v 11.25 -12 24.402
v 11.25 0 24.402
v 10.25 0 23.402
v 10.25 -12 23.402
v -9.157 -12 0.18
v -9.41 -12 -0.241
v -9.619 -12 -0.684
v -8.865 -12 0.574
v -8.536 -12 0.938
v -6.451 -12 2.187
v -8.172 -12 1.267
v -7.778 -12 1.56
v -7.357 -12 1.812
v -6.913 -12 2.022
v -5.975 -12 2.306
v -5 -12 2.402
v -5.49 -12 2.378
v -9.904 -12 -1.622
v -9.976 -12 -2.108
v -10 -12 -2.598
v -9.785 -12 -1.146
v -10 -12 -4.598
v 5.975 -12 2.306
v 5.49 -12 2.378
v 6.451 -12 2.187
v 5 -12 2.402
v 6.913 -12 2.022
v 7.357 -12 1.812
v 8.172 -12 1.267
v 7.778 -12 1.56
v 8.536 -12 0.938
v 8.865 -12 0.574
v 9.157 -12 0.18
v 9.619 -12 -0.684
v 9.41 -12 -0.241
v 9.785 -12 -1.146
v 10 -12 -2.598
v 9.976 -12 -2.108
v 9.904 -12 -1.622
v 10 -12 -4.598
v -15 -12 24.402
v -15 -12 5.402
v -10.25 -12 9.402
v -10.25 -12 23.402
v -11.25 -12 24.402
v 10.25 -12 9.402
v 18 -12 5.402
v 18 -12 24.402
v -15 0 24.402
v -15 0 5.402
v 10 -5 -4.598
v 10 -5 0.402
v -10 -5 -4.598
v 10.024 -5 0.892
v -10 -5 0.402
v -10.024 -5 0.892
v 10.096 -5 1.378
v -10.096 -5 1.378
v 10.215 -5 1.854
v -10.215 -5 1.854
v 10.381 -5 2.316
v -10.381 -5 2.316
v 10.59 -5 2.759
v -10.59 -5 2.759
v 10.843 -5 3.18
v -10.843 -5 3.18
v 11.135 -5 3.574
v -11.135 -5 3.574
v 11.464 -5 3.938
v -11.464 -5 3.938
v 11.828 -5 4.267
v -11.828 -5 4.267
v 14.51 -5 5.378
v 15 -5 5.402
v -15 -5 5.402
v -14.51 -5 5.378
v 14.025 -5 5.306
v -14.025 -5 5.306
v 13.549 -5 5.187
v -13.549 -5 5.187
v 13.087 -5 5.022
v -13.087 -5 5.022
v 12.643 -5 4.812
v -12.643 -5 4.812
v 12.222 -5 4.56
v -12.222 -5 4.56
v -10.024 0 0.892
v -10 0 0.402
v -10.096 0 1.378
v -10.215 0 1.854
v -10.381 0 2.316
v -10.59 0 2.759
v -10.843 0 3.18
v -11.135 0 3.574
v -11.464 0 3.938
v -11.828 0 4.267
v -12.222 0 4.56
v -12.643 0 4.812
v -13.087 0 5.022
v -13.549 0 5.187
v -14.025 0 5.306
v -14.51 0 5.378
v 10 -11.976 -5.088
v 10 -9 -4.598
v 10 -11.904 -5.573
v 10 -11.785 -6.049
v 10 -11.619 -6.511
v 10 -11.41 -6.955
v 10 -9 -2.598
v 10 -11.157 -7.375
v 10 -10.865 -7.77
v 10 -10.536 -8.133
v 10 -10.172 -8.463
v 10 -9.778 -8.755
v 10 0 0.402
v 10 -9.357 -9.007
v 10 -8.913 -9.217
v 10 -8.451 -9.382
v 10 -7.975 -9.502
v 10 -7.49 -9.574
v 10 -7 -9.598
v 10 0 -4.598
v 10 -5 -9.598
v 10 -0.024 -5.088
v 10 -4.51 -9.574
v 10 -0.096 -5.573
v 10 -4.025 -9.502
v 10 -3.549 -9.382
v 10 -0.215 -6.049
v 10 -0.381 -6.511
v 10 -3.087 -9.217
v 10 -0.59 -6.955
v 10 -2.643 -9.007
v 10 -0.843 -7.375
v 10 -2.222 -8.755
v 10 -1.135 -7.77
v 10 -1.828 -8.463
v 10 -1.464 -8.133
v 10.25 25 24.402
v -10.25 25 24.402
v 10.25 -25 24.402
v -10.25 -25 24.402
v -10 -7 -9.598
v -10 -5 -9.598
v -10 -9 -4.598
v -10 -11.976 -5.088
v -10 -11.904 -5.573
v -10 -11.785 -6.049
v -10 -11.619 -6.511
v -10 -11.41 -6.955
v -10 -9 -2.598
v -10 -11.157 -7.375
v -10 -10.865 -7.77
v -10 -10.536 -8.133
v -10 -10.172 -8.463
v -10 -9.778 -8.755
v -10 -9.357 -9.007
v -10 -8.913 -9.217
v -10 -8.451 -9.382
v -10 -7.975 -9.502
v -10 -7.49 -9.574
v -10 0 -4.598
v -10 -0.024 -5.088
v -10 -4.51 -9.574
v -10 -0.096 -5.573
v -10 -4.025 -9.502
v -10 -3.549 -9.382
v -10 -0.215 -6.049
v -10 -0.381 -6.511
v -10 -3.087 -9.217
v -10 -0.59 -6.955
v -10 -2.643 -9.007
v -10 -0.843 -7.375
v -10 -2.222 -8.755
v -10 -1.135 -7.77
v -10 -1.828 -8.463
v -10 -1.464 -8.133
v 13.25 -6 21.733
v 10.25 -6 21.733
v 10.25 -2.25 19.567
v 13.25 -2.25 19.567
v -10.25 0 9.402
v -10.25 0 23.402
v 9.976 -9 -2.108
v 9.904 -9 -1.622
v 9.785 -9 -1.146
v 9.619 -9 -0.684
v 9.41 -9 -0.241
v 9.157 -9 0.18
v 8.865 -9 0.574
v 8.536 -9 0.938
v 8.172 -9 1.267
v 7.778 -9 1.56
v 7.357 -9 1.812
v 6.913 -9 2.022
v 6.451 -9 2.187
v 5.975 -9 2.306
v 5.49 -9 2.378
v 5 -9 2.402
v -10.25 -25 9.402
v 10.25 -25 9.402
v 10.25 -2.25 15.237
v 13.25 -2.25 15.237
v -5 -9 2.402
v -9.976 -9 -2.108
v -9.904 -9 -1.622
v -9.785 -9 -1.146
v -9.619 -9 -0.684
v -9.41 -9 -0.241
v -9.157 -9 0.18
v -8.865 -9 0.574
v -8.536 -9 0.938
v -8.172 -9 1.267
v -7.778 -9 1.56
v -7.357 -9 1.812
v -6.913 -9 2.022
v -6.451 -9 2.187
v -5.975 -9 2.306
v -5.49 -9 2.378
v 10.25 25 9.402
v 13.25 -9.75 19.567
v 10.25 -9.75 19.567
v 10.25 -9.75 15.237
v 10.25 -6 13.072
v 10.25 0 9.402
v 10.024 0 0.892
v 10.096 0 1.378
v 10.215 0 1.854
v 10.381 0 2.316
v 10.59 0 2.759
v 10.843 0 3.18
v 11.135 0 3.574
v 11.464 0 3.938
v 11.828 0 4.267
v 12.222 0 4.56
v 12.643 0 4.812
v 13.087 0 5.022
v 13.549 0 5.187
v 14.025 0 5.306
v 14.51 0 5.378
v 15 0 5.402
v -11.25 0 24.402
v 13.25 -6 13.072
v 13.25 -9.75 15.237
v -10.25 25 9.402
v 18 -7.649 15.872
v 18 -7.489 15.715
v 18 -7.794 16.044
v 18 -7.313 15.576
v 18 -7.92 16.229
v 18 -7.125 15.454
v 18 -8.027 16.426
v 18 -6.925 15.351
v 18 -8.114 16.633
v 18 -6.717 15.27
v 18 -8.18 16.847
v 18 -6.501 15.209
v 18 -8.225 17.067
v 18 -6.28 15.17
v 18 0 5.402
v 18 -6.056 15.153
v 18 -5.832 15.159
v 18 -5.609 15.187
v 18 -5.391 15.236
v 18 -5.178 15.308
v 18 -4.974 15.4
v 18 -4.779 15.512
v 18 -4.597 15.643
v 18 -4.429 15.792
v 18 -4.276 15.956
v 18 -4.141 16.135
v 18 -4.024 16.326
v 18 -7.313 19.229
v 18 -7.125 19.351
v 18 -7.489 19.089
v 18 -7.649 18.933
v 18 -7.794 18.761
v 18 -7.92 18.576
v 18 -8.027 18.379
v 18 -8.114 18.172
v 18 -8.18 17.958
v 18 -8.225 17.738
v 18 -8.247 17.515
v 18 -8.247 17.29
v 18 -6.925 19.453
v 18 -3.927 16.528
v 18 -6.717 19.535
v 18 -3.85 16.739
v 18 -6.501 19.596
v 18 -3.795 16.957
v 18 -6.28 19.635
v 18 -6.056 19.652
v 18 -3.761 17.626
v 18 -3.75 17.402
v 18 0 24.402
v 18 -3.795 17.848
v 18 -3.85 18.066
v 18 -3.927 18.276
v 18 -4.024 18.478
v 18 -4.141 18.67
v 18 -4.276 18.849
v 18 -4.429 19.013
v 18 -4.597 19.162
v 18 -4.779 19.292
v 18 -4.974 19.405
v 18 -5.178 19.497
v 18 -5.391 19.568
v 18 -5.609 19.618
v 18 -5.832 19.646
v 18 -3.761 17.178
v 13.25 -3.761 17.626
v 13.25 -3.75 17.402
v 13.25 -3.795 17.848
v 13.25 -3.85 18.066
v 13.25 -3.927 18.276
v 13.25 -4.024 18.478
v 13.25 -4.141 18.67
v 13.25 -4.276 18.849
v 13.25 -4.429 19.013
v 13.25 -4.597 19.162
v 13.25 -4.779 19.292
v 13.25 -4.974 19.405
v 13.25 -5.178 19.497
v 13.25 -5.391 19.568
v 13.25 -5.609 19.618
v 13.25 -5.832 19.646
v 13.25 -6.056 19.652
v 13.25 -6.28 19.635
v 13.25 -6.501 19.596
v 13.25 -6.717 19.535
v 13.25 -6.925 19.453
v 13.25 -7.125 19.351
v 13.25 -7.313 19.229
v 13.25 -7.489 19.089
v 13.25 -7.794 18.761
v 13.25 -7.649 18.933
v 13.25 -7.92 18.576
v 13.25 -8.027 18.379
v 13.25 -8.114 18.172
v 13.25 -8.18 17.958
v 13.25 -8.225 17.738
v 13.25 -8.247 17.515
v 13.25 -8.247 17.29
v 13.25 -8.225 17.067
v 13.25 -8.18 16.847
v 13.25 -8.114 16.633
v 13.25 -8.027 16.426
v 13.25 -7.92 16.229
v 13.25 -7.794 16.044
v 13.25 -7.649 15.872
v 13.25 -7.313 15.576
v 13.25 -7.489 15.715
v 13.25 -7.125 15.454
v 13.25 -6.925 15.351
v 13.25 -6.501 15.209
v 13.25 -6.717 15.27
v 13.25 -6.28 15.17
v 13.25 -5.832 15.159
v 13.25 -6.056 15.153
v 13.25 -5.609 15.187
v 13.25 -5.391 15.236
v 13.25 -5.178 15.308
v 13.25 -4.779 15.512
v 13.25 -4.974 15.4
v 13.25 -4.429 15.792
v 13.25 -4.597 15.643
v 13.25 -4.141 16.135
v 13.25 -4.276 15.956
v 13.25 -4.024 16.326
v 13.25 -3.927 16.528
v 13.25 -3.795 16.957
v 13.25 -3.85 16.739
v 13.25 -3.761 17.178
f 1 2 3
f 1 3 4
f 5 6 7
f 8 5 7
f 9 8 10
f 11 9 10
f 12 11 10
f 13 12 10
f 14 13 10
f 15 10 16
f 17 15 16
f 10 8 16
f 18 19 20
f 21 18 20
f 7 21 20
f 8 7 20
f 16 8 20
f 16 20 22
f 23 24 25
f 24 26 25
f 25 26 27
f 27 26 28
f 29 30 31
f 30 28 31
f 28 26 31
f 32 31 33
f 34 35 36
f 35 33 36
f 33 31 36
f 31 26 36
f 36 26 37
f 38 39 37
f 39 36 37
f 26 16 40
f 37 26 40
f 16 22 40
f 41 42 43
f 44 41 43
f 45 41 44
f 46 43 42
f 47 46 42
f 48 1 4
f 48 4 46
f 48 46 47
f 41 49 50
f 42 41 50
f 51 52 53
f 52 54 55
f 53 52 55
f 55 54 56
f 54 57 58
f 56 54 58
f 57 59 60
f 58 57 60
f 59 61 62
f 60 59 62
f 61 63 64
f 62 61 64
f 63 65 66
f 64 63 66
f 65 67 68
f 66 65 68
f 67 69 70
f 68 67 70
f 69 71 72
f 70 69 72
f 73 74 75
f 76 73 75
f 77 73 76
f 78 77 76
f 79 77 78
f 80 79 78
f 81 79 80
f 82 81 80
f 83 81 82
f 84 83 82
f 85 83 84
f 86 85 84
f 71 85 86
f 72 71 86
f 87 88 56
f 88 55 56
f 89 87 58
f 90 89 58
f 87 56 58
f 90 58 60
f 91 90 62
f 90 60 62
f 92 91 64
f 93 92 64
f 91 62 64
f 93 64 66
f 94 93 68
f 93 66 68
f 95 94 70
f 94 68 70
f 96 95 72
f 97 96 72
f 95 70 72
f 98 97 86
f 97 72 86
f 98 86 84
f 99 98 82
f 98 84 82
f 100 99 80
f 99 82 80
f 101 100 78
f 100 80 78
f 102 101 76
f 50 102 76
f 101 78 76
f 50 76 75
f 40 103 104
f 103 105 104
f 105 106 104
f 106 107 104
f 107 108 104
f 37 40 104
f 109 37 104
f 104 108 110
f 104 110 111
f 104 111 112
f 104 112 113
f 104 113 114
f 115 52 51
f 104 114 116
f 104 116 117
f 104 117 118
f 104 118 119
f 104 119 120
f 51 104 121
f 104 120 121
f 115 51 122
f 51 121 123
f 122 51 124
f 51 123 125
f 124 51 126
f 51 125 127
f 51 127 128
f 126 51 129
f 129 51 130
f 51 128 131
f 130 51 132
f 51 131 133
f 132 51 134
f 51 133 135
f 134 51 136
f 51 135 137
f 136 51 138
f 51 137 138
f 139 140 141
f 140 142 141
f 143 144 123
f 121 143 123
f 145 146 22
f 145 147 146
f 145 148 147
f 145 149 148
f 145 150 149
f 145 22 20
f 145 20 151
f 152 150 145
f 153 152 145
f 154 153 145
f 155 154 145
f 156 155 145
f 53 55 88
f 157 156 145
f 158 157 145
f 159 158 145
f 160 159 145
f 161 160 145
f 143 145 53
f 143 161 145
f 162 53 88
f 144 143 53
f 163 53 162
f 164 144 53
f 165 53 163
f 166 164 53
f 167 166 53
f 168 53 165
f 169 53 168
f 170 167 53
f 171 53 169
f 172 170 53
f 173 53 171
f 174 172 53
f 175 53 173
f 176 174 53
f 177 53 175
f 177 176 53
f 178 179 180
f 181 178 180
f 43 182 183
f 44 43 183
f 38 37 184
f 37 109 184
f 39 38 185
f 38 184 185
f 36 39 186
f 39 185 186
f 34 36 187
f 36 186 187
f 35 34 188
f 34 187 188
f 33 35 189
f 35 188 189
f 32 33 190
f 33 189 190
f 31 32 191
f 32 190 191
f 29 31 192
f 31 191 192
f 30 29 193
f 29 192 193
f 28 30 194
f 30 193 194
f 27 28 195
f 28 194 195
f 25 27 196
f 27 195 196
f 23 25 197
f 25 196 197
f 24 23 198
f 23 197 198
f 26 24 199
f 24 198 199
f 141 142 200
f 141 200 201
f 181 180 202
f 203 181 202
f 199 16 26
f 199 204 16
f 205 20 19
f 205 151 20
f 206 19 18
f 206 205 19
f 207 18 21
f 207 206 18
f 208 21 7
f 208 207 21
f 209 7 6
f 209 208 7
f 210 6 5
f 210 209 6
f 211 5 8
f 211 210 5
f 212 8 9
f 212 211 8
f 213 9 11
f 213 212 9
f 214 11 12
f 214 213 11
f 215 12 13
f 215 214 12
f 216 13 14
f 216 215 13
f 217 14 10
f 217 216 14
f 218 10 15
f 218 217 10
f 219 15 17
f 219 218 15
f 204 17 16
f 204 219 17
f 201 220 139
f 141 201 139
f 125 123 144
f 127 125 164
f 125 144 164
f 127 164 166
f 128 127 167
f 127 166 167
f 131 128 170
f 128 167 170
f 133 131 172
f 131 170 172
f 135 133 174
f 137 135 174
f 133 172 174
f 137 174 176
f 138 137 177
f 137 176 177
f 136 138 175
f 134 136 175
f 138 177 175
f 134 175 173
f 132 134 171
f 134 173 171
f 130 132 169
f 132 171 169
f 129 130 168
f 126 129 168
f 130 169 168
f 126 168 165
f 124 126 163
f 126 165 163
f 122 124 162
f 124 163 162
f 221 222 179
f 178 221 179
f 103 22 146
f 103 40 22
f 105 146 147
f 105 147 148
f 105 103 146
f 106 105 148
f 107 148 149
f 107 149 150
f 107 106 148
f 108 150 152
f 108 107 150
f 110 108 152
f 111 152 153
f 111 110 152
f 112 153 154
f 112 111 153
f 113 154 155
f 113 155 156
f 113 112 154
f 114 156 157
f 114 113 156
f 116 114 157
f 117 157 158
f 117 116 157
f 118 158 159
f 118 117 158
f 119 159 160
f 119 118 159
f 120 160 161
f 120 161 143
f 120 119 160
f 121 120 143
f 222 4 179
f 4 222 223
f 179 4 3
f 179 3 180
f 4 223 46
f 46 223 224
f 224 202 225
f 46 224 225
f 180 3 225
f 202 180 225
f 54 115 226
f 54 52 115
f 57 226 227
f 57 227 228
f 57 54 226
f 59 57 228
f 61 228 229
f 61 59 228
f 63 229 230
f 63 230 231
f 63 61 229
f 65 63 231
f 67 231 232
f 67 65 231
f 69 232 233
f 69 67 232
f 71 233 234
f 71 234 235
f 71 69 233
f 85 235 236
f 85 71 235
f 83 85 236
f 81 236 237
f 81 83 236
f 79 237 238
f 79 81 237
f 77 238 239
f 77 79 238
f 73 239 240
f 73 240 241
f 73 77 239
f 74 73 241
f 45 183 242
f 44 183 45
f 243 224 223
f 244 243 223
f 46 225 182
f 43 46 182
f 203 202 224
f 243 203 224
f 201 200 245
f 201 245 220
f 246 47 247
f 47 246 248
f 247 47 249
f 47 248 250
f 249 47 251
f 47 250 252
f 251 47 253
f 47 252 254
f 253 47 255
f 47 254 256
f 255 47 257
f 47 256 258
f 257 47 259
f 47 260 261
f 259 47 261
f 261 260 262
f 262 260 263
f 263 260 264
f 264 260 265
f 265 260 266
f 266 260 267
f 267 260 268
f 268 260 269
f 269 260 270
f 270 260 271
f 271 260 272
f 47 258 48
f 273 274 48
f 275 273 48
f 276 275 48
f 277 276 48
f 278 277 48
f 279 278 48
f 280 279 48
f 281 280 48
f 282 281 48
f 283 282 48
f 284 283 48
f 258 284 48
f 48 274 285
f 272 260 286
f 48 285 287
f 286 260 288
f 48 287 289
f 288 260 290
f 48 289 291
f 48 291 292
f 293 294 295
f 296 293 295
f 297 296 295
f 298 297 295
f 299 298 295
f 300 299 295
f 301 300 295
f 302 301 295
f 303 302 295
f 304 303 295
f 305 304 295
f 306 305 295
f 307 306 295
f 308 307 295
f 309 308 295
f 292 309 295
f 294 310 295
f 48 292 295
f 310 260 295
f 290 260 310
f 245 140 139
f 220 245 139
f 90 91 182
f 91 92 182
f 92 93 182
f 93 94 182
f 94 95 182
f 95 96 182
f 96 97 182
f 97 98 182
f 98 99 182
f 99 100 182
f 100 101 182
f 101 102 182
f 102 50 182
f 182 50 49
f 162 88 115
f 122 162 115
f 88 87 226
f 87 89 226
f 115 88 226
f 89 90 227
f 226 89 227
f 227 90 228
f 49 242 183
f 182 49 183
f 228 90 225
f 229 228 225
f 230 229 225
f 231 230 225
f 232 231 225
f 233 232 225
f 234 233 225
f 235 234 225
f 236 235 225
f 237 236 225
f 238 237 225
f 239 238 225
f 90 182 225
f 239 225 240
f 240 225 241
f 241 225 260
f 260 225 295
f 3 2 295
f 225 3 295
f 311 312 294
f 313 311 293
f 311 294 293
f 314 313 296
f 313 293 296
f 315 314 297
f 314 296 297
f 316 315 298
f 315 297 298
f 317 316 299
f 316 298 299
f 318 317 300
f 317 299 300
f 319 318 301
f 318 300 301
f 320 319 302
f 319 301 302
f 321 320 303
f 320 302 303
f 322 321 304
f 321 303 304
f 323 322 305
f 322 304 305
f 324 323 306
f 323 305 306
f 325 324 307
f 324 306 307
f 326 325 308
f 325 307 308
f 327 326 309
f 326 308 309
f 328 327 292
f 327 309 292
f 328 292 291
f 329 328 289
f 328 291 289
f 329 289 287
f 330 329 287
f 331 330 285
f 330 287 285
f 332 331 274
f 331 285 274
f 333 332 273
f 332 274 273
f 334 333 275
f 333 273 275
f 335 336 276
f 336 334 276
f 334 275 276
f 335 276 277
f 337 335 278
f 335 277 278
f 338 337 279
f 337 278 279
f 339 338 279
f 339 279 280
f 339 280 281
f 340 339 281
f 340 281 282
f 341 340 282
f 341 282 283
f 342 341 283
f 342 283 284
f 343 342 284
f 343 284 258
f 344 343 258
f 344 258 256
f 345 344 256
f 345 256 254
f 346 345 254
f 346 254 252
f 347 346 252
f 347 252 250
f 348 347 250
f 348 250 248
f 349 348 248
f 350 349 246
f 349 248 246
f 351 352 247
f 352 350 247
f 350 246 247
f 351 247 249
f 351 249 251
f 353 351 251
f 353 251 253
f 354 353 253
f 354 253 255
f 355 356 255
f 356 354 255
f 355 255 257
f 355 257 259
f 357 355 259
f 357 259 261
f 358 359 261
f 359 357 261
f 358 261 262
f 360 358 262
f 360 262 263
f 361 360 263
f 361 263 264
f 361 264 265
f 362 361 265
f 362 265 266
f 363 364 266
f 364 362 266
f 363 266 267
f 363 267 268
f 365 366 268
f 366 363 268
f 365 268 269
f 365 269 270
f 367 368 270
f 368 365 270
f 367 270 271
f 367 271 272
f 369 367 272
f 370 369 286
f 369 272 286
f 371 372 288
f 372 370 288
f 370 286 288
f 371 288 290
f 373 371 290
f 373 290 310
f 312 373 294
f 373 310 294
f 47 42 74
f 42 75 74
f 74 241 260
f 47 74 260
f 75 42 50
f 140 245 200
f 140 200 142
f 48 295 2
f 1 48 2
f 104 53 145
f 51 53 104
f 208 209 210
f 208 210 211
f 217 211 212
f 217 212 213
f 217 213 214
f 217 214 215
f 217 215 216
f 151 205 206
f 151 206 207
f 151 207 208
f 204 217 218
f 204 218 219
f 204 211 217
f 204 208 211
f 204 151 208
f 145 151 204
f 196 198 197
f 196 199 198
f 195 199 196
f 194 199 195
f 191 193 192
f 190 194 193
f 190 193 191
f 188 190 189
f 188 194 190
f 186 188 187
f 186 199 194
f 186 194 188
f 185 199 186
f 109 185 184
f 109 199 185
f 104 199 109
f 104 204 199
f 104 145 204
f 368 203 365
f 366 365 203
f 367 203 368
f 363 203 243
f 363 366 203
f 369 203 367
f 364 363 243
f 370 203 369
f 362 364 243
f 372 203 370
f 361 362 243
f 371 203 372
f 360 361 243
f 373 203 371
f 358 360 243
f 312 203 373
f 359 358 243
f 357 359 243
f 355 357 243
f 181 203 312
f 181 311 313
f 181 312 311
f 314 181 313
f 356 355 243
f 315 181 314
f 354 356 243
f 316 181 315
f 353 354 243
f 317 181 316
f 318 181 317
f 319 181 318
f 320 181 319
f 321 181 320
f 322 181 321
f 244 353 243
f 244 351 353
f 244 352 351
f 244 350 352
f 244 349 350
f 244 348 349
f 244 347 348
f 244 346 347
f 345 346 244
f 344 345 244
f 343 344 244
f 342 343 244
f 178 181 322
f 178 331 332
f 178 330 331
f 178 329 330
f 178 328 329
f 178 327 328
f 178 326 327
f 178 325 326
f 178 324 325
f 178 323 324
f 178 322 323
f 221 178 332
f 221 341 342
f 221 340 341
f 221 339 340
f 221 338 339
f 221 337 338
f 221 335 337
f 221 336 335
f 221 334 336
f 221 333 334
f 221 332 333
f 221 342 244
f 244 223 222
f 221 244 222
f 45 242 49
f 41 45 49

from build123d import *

# Parameters (mm, degrees)
F0_W          = 20.5
F0_H          = 15
F1_DEPTH      = 25
F1_DEPTH_BACK = 25
F3_DEPTH      = 12
F4_R          = 2.25
F5_DEPTH      = 7.75
F6_R          = 2.25
F7_DEPTH      = 3
F8_SIZE       = 1
F9_W          = 20
F9_H          = 15
F10_DEPTH     = 5
F11_W         = 20
F11_H         = 5
F12_DEPTH     = 7
F13_W         = 20
F13_H         = 3
F14_DEPTH     = 7
F15_R         = 4.99999


# Not quite as in the source:
# - a fillet or chamfer is up to 0.001 mm smaller than in the source, because OpenCascade refuses the exact size


with BuildPart() as f1:
    # F0 (on Front) → F1 (new body, two sides)
    with BuildSketch(Plane.XZ) as f1_sk:
        with Locations((0, 16.9023849815)):
            Rectangle(F0_W, F0_H)
    extrude(amount=F1_DEPTH)
    extrude(f1_sk.sketch, amount=-F1_DEPTH_BACK)


with BuildPart() as f3:
    # F2 (on Front) → F3 (new body)
    with BuildSketch(Plane.XZ):
        Polygon((-10.25, 24.4023849815), (-15, 24.4023849815), (-15, 5.4023849815), (18, 5.4023849815), (18, 24.4023849815), (10.25, 24.4023849815), (10.25, 9.4023849815), (-10.25, 9.4023849815), align=None)
    extrude(amount=F3_DEPTH)

    # F4 (on face) → F5 (cut, through all)
    with BuildSketch(Plane.YZ.offset(18)):
        with Locations((-6, 17.4023849815)):
            Circle(F4_R)
    extrude(amount=-F5_DEPTH, mode=Mode.SUBTRACT)

    # F6 (on face) → F7 (cut)
    with BuildSketch(Plane(origin=(10.25, 0, 0), x_dir=(0, -1, 0), z_dir=(-1, 0, 0))):
        Polygon((9.75, 19.567448491), (6, 21.7325120004), (2.25, 19.567448491), (2.25, 15.2373214721), (6, 13.0722579626), (9.75, 15.2373214721), align=None)
        with Locations((6, 17.4023849815)):
            Circle(F6_R, mode=Mode.SUBTRACT)
    extrude(amount=-F7_DEPTH, mode=Mode.SUBTRACT)

    # F8
    f8_edges = [f3.edges().sort_by_distance(p)[0] for p in [
        (10.25, -6, 24.402385),
        (-10.25, -6, 24.402385),
    ]]
    chamfer(f8_edges, length=F8_SIZE)

    # F9 (on face) → F10 (join)
    with BuildSketch(Plane(origin=(0, 0, 0), x_dir=(-1, 0, 0), z_dir=(0, 1, 0))):
        with Locations((0, -2.0976150185)):
            Rectangle(F9_W, F9_H)
    extrude(amount=-F10_DEPTH)

    # F11 (on face) → F12 (join)
    with BuildSketch(Plane.XZ.offset(5)):
        with Locations((0, -7.0976150185)):
            Rectangle(F11_W, F11_H)
    extrude(amount=F12_DEPTH)

    # F13 (on face) → F14 (join)
    with BuildSketch(Plane.XY.offset(-4.5976150185)):
        with Locations((0, -10.5)):
            Rectangle(F13_W, F13_H)
    extrude(amount=F14_DEPTH)

    # F15 (radius 5 in the source; OpenCascade refuses exactly that, so slightly less here)
    f15_edges = [f3.edges().sort_by_distance(p)[0] for p in [
        (0, 0, -9.597615),
        (0, -12, -9.597615),
        (10, -10.5, 2.402385),
        (-10, -10.5, 2.402385),
        (10, -2.5, 5.402385),
        (-10, -2.5, 5.402385),
    ]]
    fillet(f15_edges, radius=F15_R)


solid = Compound([f1.part, f3.part])
